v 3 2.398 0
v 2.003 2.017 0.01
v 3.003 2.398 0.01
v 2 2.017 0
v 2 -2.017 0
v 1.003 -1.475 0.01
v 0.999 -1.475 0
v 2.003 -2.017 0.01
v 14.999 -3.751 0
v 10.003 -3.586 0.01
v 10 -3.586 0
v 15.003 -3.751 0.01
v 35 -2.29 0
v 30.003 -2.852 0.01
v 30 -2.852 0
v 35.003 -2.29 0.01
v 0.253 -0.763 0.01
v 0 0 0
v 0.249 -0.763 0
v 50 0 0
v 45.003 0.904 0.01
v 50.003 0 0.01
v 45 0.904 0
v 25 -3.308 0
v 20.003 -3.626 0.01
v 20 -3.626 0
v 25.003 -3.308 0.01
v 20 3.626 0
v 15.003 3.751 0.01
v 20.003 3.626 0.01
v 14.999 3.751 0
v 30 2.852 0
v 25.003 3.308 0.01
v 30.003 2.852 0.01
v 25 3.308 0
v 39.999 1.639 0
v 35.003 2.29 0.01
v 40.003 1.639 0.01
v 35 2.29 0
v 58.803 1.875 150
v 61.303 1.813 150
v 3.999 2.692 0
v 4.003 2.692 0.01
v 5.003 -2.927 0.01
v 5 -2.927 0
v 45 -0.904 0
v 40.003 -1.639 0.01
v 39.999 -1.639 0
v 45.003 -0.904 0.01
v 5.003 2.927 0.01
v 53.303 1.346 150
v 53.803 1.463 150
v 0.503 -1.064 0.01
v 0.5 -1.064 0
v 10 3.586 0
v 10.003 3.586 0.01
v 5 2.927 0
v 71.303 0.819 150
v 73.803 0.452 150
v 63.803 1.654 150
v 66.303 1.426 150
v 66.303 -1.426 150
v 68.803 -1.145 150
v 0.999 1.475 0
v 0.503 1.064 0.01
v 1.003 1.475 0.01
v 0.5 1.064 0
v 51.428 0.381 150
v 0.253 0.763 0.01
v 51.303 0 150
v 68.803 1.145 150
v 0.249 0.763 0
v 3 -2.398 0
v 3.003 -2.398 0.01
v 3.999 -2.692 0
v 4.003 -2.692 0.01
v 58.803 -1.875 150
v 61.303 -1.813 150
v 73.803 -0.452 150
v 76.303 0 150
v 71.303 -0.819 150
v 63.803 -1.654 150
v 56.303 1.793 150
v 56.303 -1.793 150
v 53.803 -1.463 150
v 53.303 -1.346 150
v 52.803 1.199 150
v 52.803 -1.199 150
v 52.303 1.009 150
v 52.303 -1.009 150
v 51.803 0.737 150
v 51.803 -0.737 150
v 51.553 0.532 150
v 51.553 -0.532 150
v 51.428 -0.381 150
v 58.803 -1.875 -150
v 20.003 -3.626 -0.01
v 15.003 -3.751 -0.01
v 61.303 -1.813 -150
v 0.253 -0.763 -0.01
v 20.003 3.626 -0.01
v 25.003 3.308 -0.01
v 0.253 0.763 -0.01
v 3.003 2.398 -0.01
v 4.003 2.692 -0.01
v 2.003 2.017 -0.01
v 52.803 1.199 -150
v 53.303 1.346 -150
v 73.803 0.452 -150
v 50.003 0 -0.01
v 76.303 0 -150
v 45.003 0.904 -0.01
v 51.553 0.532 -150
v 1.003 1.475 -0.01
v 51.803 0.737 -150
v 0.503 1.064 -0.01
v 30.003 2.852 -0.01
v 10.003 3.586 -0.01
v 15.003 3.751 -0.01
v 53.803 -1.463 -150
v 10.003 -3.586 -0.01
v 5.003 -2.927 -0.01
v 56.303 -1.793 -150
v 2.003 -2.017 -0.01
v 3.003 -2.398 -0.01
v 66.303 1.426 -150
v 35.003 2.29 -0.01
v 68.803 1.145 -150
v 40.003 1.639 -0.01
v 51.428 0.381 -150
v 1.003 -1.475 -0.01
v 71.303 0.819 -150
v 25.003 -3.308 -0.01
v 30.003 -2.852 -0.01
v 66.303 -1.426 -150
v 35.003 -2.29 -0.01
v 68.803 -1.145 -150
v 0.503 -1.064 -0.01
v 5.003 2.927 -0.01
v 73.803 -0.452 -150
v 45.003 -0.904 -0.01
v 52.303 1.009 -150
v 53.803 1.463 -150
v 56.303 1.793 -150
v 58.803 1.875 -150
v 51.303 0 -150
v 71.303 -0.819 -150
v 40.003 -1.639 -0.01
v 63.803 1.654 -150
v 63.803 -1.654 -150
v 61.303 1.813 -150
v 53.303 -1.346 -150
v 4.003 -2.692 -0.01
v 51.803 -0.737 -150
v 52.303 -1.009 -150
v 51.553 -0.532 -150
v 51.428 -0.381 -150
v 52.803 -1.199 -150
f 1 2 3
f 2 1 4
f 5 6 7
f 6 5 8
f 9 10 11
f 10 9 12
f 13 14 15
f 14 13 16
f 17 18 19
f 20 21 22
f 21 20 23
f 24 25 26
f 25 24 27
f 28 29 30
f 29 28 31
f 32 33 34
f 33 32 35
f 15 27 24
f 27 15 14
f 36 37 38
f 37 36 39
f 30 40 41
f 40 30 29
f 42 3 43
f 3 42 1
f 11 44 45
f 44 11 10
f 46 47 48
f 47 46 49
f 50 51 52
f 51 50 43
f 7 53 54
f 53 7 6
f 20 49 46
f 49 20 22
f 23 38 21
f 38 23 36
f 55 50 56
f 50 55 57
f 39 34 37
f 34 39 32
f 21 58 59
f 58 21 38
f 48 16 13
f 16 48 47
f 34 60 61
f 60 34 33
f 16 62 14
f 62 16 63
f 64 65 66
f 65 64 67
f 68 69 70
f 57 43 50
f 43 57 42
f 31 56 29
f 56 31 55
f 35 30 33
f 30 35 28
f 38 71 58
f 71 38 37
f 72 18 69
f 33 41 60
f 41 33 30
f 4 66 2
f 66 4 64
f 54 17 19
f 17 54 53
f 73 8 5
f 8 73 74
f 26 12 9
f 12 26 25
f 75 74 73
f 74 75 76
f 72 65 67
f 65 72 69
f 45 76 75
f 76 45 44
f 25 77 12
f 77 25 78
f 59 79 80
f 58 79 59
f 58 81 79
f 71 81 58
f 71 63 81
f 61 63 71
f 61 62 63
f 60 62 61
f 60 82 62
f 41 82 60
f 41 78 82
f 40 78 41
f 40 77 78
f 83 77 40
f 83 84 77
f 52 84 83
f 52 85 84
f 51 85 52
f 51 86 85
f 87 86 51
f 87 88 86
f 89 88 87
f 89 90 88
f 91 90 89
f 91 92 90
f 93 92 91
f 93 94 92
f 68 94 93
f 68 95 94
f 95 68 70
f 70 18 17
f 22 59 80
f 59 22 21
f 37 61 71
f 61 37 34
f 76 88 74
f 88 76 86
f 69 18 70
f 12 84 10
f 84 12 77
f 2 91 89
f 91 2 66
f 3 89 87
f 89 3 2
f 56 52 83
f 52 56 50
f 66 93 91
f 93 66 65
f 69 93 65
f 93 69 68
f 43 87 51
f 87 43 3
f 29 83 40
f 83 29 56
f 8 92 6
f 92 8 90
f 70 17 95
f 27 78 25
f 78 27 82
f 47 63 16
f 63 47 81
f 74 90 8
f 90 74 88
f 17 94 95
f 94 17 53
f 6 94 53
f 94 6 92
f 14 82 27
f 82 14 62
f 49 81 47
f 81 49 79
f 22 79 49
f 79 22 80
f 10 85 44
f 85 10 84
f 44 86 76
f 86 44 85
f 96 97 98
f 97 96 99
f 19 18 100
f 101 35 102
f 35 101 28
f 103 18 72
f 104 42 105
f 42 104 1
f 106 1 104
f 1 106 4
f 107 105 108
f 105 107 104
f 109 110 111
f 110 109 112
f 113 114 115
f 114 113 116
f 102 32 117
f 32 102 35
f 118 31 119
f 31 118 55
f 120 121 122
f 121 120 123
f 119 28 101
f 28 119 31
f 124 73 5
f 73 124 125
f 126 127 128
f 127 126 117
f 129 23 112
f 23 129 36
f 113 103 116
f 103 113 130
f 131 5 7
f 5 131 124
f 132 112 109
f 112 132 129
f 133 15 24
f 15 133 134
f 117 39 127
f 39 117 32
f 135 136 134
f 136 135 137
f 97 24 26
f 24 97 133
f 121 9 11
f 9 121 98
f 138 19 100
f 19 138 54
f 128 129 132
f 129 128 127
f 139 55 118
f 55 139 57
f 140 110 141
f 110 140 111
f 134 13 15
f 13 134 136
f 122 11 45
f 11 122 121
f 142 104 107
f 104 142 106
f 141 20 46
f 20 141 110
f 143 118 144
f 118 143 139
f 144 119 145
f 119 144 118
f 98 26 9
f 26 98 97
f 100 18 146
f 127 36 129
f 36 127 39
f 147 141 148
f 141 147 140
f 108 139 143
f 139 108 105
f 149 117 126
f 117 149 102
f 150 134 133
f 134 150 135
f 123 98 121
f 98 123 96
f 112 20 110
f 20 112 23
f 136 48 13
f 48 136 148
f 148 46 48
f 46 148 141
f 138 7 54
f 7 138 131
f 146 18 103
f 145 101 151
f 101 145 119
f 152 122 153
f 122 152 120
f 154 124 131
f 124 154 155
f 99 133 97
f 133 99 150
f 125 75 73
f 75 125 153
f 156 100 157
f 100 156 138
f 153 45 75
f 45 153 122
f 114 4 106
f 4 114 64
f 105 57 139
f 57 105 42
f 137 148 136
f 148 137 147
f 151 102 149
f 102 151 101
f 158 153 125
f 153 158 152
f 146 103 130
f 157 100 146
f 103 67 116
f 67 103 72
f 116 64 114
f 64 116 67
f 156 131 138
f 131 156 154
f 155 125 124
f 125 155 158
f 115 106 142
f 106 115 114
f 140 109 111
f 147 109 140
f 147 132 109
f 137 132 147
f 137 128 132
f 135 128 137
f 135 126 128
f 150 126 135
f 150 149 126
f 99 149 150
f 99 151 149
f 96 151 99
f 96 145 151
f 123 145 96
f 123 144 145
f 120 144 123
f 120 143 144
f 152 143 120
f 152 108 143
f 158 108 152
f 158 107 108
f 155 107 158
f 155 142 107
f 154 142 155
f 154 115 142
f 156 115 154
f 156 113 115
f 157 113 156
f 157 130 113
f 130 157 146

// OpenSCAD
// Parametric NACA 00xx airfoil.
// See http://en.wikipedia.org/wiki/NACA_airfoil

// preview[view:south, tilt:top diagonal]

WINGS = 2; // [2:Dual Wings, 1:Single Wing]

// Wing chord (leading edge to trailing edge)
CHORD = 50;

// Wing length (root to tip)
LENGTH = 150;

// Max wing thickness (as percentage of chord length)
t = 15;

// Scale proportion of wing tip vs. wing root
TAPER = 0.5;

// Sweep back angle of wing
SWEEP_ANGLE = 20;

/* [Hidden] */
E = 0.01;

function y(x) = t / 20.0 *
         (.2969 * sqrt(x)
          -0.1260 * x
          -0.3516 * pow(x, 2)
          +0.2843 * pow(x, 3)
          -0.1015 * pow(x, 4));

// Argh!  No for loop initializer in open scad!
a = [[0.0, y(0.0)],
     [0.005, y(0.005)],
     [0.01, y(0.01)],
     [0.02, y(0.02)], [0.04, y(0.04)], [0.06, y(0.06)], [0.08, y(0.08)],
     [0.1, y(0.1)],
     [0.2, y(0.2)],
     [0.3, y(0.3)],
     [0.4, y(0.4)],
     [0.5, y(0.5)],
     [0.6, y(0.6)],
     [0.7, y(0.7)],
     [0.8, y(0.8)],
     [0.9, y(0.9)],
     [1.0, 0.0],
     [0.9, -y(0.9)],
     [0.8, -y(0.8)],
     [0.7, -y(0.7)],
     [0.6, -y(0.6)],
     [0.5, -y(0.5)],
     [0.4, -y(0.4)],
     [0.3, -y(0.3)],
     [0.2, -y(0.2)],
     [0.1, -y(0.1)],
     [0.08, -y(0.08)], [0.06, -y(0.06)], [0.04, -y(0.04)], [0.02, -y(0.02)],
     [0.01, -y(0.01)],
     [0.005, -y(0.005)],
     [0.0, -y(0.0)]
     ];

module naca_2d(chord) {
  scale([chord, chord, 1])
    polygon(points=a);
}

module naca_25d(chord) {
  linear_extrude(height=E) naca_2d(chord);
}

module reflect_z() {
  multmatrix(m=[[1, 0, 0, 0],
                [0, 1, 0, 0],
                [0, 0, -1, 0],
                [0, 0, 0, 1]])
    child(0);
}

module naca(chord, length, taper=1, sweep_ang=0) {
  sweep = sin(sweep_ang);
  multmatrix(m=[ [1, 0, sweep, 0],
                 [0, 1, 0, 0],
                 [0, 0, 1, 0],
                 [0, 0, 0, 1]
               ])
   hull() {
     naca_25d(chord);
     translate([0, 0, length - E])
       scale([taper, taper, 1])
         naca_25d(chord);
  }
}

naca(CHORD, LENGTH, taper=TAPER, sweep_ang=SWEEP_ANGLE);
if (WINGS == 2) {
  reflect_z()
    naca(CHORD, LENGTH, taper=TAPER, sweep_ang=SWEEP_ANGLE);
}
